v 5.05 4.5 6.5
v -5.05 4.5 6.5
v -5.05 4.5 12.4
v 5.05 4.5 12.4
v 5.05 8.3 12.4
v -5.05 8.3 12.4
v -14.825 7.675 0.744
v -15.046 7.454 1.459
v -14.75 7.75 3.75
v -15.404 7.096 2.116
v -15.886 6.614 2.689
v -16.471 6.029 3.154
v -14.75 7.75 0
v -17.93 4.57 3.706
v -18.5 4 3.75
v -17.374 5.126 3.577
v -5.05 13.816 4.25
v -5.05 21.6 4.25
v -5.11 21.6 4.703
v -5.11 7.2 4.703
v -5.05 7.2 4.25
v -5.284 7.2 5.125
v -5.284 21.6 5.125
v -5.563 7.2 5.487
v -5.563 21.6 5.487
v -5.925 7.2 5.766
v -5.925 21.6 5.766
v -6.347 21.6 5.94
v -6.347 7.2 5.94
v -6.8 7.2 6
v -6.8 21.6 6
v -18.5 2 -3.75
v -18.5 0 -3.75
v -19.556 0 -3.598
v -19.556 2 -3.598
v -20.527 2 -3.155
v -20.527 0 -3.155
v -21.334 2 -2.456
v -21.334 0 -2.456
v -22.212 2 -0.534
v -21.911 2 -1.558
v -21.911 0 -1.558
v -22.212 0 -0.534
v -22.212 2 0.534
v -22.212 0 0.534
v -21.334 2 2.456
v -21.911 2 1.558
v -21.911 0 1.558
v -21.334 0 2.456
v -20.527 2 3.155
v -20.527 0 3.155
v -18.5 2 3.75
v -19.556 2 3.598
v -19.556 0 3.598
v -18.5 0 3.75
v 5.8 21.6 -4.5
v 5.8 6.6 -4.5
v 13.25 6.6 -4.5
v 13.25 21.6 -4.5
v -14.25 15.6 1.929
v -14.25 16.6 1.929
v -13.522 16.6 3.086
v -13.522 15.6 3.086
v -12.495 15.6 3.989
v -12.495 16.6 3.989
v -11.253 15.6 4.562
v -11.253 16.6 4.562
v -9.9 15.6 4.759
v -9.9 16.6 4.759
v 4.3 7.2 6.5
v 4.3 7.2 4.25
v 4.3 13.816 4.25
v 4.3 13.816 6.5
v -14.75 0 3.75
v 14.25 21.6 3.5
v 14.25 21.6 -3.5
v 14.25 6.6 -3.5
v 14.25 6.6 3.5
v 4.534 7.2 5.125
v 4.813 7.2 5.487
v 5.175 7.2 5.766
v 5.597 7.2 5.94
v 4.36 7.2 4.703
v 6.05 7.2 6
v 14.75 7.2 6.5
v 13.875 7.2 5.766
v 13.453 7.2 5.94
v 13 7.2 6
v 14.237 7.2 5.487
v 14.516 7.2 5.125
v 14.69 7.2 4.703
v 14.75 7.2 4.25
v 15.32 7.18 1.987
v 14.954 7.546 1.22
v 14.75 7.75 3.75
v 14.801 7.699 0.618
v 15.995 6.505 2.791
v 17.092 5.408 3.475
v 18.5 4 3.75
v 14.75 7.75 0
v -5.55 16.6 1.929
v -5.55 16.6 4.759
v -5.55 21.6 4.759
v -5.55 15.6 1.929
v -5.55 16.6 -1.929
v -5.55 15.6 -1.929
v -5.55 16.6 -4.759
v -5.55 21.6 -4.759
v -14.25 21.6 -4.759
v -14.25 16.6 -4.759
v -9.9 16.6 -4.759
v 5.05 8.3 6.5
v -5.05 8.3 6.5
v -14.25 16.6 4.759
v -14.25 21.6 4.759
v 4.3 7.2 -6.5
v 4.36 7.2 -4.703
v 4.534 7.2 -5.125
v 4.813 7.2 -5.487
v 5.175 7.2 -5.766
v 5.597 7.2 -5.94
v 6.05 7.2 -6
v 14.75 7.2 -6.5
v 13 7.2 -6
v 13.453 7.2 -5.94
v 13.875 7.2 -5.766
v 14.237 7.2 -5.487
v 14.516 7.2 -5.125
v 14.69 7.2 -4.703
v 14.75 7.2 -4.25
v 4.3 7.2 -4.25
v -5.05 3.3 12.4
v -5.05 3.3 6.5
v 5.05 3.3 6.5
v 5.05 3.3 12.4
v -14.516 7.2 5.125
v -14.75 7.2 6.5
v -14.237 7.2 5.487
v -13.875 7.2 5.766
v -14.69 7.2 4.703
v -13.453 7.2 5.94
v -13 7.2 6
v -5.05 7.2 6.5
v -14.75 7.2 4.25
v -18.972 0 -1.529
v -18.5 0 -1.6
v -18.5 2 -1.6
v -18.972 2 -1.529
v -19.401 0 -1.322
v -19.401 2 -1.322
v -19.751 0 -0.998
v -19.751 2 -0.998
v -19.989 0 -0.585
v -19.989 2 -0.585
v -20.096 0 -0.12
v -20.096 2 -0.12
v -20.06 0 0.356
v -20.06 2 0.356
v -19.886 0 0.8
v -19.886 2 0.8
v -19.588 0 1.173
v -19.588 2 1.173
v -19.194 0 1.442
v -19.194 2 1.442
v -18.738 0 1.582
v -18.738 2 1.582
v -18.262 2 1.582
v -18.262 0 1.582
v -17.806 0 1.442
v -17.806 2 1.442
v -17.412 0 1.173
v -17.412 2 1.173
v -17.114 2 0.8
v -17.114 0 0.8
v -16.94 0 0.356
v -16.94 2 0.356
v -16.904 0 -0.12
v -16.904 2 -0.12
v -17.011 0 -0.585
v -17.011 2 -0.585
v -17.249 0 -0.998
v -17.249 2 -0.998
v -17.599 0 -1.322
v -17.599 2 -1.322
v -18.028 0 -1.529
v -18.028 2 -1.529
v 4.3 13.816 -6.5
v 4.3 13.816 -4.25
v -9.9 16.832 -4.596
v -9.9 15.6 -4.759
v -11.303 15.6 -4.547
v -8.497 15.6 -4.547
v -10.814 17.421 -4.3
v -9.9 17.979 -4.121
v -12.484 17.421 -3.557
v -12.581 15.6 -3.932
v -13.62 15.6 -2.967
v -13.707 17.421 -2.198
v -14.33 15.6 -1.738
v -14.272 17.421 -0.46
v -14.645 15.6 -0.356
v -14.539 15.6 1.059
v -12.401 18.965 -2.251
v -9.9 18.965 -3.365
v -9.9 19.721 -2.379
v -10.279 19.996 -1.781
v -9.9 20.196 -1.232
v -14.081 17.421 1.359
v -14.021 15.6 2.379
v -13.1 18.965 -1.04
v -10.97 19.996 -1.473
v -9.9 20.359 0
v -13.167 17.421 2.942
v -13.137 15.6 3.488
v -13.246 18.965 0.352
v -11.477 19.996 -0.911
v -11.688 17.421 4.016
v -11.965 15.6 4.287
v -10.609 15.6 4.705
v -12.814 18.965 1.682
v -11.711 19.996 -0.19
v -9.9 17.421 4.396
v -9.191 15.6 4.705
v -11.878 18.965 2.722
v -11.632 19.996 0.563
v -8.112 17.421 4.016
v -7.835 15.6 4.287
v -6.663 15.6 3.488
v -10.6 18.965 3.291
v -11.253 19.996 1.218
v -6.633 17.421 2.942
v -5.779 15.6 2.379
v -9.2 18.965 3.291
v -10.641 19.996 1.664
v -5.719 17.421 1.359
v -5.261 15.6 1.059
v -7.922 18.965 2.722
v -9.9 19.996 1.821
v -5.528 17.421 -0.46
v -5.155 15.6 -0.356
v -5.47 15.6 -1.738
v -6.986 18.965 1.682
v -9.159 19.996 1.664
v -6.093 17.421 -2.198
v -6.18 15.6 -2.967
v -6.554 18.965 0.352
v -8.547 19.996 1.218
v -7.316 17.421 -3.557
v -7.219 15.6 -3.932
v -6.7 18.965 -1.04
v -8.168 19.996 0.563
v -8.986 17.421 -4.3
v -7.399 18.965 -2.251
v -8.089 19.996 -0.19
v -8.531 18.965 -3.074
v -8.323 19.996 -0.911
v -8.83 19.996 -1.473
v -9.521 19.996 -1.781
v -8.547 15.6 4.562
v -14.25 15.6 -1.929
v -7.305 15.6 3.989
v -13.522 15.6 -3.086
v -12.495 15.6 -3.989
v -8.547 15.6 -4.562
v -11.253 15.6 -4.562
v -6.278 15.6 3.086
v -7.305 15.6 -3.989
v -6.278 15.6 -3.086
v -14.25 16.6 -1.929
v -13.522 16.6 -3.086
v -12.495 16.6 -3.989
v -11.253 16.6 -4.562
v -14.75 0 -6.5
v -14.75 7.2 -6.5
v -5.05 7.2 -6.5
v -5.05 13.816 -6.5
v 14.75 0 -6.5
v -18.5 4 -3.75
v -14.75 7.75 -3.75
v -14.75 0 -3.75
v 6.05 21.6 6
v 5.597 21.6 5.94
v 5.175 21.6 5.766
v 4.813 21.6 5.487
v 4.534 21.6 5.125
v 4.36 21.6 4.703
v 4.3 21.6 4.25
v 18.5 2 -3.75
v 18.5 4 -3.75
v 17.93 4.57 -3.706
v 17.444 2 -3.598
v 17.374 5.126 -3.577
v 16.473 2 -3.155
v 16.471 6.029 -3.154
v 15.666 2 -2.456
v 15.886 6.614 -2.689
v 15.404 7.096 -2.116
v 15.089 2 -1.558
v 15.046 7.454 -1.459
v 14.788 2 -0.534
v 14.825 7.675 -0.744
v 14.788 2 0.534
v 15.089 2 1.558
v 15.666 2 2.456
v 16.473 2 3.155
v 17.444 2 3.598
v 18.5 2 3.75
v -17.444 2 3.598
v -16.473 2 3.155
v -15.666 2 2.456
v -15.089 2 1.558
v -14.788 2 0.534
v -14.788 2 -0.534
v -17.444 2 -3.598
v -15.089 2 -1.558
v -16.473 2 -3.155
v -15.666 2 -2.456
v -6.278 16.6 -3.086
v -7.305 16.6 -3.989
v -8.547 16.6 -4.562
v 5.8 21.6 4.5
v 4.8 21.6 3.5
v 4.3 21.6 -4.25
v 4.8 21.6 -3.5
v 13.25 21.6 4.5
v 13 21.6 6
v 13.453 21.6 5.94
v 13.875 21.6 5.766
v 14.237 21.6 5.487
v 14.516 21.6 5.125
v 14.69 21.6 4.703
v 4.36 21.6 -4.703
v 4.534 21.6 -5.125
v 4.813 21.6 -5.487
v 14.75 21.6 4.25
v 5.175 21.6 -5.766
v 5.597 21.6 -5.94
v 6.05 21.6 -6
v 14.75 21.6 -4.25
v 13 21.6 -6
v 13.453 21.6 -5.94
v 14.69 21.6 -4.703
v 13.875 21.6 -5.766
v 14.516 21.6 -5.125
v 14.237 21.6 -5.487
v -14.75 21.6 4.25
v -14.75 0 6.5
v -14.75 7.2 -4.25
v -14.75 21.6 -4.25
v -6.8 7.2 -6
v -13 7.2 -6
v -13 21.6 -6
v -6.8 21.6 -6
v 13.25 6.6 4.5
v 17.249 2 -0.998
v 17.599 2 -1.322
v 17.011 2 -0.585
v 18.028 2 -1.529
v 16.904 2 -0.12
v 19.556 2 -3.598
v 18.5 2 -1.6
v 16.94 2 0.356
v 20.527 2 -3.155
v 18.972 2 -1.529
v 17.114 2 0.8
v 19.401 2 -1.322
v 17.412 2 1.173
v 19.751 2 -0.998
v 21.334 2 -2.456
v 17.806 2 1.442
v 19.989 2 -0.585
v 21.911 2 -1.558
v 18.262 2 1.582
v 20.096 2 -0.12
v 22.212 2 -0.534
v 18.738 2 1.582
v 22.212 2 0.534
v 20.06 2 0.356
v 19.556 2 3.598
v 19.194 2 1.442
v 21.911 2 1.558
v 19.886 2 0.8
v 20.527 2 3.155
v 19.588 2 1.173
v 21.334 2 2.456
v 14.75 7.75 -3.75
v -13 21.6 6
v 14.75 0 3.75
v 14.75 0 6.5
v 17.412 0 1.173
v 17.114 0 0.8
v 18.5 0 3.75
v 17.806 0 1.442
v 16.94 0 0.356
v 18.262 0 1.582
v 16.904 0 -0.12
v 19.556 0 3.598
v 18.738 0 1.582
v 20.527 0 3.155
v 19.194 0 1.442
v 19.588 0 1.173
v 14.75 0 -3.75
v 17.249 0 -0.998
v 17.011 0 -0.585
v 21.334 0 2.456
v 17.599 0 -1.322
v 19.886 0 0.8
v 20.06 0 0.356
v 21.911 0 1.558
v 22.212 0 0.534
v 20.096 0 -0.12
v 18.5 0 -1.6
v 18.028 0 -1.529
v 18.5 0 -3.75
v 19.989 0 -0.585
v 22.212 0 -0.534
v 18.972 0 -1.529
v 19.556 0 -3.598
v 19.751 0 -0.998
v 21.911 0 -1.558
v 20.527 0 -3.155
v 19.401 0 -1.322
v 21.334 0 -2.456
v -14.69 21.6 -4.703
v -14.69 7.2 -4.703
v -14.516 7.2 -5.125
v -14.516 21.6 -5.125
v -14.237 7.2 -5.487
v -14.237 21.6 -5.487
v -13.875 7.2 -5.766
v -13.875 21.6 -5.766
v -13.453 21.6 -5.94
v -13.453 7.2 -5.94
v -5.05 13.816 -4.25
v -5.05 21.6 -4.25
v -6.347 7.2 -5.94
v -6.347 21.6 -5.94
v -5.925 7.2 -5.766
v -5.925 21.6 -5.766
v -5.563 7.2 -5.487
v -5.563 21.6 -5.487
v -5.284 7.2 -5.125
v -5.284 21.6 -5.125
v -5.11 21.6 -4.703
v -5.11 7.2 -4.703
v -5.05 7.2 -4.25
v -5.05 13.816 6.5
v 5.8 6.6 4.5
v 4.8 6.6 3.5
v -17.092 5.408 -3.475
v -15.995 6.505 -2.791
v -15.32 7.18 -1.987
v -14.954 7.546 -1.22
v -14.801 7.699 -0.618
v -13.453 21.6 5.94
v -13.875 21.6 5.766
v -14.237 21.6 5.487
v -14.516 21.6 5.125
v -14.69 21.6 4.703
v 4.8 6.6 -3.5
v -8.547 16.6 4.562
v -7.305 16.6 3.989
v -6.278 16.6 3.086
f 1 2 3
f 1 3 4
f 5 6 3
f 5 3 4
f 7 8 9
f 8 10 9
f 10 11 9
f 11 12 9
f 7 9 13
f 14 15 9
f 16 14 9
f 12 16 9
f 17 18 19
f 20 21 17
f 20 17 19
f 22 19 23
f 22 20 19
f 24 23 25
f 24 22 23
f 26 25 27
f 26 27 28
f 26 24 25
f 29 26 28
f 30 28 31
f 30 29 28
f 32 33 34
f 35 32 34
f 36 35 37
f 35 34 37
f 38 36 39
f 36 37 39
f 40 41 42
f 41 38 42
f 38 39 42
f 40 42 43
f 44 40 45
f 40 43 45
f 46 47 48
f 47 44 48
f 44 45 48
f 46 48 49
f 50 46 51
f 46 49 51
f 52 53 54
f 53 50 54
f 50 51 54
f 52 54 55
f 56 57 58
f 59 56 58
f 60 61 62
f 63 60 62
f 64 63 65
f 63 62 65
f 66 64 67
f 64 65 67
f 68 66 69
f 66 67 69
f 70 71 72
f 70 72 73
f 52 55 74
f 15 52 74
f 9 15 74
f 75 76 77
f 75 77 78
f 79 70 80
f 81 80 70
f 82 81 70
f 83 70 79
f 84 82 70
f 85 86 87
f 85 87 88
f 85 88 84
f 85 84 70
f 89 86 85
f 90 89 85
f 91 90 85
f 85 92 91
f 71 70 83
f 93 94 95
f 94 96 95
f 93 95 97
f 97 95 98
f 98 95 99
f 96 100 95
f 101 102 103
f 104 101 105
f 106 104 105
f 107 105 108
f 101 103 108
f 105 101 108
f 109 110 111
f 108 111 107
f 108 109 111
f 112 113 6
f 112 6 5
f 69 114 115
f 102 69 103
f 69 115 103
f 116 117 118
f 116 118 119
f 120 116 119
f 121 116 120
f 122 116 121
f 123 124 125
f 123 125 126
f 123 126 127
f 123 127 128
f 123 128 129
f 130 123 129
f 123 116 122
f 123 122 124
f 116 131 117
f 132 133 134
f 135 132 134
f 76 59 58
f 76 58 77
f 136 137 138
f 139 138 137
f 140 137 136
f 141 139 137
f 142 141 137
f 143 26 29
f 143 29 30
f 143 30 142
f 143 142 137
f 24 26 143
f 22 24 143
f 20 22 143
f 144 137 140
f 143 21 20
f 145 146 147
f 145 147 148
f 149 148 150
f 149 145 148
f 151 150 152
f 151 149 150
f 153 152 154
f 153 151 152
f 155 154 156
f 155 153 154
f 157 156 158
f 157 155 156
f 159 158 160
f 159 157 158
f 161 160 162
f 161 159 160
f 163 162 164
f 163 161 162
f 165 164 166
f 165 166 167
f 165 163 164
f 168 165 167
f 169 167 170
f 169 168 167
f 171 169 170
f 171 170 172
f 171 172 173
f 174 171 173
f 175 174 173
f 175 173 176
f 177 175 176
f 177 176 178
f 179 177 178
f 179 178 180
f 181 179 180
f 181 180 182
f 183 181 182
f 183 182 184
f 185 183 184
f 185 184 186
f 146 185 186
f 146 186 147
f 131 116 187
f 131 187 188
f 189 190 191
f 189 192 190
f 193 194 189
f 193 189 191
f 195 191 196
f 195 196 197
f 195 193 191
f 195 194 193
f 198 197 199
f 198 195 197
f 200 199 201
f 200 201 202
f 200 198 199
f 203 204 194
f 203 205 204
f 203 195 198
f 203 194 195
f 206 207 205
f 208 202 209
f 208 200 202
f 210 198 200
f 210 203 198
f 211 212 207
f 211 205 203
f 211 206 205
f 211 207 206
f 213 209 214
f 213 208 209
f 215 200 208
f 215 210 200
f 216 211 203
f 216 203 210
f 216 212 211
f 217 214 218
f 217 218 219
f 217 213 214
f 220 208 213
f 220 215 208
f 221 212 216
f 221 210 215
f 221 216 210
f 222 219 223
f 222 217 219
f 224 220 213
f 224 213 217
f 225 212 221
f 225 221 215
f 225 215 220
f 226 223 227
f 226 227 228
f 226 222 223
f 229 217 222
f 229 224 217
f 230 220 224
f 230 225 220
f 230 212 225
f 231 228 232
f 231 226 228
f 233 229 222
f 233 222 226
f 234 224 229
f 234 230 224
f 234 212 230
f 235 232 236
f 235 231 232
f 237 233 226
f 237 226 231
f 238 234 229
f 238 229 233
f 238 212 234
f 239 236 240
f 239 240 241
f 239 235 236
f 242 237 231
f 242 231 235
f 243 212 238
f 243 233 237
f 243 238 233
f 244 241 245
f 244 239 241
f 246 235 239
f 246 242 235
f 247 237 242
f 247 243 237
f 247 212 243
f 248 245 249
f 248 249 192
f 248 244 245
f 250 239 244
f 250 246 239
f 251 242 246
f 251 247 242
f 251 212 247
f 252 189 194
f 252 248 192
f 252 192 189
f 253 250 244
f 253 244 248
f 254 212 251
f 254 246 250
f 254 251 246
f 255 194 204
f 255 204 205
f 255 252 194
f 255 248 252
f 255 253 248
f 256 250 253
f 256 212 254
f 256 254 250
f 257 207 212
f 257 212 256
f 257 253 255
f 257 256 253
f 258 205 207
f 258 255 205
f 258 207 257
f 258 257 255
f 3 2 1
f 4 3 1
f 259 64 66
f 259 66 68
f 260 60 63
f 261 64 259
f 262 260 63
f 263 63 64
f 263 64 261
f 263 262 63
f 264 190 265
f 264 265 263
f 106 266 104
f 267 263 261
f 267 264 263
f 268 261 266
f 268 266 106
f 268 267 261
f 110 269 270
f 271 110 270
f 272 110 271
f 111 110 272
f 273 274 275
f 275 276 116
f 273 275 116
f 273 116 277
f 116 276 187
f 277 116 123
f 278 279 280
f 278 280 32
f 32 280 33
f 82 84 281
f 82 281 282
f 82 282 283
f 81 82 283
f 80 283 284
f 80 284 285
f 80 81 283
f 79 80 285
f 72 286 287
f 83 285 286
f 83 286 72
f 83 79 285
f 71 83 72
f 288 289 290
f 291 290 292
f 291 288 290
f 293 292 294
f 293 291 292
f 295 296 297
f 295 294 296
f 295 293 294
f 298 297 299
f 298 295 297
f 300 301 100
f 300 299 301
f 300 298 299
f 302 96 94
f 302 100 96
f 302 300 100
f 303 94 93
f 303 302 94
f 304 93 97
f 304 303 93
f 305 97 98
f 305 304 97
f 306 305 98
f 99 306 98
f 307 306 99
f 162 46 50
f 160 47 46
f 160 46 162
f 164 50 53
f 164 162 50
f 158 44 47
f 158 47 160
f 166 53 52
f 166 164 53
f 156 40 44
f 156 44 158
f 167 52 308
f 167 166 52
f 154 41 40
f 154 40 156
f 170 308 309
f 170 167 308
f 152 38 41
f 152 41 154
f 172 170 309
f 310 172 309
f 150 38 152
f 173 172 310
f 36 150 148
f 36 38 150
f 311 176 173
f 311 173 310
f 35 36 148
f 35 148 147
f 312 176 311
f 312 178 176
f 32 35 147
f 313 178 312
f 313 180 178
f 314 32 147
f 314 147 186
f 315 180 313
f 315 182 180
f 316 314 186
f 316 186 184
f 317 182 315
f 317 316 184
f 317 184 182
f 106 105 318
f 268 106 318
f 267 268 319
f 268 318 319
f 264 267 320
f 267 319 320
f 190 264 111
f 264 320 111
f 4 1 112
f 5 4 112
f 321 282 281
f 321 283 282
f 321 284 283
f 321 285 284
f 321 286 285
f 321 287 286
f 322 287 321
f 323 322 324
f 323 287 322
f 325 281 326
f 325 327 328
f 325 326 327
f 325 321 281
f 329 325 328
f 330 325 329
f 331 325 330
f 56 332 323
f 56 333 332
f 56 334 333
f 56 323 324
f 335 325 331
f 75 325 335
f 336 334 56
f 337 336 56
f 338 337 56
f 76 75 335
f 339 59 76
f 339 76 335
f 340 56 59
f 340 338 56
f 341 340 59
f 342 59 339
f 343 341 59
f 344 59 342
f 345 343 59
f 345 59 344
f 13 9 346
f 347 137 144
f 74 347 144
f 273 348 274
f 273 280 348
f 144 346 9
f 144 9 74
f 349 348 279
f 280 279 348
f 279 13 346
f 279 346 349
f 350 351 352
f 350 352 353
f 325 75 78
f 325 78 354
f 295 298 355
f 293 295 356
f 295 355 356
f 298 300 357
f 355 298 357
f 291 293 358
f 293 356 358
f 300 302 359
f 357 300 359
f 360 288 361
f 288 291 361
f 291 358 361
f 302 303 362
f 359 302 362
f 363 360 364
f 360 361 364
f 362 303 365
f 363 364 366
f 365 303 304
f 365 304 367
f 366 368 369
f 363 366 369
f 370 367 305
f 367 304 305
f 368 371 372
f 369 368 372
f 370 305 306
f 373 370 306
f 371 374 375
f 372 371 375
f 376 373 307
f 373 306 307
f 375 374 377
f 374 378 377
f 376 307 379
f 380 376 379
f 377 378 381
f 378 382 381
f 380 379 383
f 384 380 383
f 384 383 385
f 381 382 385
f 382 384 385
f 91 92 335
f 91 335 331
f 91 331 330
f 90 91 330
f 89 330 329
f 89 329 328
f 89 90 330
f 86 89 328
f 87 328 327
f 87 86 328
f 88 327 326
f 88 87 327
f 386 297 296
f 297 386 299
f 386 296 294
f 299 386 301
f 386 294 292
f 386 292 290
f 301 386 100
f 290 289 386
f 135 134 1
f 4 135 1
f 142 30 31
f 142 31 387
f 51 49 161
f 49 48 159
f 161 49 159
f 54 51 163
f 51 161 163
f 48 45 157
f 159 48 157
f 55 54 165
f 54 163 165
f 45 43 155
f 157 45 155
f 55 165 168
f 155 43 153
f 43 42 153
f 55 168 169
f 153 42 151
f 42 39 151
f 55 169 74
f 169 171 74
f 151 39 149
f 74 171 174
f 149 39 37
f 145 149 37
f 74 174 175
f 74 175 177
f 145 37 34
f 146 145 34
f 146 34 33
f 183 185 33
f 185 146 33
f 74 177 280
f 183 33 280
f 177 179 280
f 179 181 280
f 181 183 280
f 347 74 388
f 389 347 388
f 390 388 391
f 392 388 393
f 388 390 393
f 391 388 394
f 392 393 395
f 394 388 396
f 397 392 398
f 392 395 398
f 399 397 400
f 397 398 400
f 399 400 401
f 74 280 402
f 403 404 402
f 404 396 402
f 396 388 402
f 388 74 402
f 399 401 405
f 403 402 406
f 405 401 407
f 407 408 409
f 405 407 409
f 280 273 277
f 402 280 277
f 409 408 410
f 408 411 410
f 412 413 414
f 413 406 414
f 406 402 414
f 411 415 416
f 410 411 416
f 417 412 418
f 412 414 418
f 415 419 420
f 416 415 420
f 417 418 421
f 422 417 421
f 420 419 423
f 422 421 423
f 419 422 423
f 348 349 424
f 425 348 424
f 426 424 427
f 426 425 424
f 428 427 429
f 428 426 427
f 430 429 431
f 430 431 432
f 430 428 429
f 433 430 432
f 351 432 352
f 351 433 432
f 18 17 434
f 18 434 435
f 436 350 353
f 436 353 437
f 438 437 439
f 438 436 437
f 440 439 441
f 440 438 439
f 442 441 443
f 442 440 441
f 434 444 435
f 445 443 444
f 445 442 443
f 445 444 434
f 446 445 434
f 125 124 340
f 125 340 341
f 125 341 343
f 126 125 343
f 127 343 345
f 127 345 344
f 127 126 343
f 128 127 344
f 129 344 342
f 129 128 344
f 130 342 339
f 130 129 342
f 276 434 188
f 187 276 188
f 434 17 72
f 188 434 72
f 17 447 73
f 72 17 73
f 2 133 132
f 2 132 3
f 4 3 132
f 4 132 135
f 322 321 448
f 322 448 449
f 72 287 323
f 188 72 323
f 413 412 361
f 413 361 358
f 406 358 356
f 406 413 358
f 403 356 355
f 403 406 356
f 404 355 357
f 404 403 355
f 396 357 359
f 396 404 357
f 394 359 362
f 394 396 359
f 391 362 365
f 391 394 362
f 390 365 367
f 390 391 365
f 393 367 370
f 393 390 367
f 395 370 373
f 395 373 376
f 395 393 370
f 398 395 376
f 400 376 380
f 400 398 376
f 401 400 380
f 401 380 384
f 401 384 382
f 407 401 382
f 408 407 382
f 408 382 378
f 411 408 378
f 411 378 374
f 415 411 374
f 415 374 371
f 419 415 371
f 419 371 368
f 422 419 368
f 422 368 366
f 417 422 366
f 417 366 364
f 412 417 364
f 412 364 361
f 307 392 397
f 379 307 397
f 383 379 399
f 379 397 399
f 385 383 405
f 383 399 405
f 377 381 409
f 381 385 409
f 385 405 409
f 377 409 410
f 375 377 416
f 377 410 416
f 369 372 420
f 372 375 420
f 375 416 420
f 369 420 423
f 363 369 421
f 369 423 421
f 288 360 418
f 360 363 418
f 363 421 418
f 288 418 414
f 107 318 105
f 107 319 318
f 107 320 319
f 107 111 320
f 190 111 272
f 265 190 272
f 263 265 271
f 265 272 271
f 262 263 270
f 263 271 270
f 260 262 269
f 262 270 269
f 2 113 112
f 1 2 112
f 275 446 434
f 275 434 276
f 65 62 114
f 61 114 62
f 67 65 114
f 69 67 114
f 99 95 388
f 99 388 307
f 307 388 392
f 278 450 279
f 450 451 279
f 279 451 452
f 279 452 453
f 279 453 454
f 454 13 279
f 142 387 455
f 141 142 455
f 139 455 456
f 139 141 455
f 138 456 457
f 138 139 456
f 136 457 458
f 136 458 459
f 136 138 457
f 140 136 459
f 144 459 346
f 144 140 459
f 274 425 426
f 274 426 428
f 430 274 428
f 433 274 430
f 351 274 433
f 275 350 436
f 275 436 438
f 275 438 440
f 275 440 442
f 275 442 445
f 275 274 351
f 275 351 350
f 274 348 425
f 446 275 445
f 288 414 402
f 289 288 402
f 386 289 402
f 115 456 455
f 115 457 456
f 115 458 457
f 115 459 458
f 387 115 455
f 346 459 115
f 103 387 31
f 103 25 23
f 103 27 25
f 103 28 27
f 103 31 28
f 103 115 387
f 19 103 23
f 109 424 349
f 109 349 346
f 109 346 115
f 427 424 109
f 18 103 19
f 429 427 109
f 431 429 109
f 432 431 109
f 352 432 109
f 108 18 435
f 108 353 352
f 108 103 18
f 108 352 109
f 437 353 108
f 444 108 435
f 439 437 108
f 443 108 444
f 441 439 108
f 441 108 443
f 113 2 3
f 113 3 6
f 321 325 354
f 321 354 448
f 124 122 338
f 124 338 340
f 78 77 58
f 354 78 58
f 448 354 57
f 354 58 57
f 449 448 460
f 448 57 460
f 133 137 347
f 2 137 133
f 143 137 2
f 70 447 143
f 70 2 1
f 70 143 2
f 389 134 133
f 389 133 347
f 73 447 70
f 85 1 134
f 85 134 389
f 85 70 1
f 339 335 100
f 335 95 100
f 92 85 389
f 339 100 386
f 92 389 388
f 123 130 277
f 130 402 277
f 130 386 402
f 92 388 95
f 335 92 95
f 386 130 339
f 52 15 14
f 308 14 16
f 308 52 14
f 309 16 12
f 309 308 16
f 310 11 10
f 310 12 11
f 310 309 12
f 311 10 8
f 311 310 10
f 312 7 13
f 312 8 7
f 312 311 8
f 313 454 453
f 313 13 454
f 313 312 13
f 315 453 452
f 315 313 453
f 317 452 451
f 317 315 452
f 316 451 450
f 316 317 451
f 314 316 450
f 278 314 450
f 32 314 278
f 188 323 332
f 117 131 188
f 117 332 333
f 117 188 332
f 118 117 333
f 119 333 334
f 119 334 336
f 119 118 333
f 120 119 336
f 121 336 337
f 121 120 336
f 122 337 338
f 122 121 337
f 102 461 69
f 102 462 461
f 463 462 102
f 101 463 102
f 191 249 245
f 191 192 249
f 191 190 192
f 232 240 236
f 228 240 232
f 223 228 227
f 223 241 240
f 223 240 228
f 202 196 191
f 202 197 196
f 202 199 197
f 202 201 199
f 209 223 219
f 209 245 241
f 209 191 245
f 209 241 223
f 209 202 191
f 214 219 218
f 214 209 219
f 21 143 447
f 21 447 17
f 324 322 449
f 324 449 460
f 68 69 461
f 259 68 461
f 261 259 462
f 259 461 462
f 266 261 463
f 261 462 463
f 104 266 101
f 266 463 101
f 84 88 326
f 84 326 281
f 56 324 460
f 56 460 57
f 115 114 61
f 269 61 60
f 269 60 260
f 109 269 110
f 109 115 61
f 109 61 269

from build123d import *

# Parameters (mm, degrees)
SKETCH_1_W          = 29.5
SKETCH_1_H          = 2.75
SKETCH_1_R          = 1.6
SKETCH_1_H_2        = 7.5
EXTRUDE_1_DEPTH     = 21.6
SKETCH_2_W          = 10.1
SKETCH_2_H          = 7.784294183
CUT_EXTRUDE_1_DEPTH = 21.6
SKETCH_13_R         = 3.75
CUT_EXTRUDE_7_DEPTH = 31.355765515
CUT_EXTRUDE_2_DEPTH = 28.288688133
SKETCH_6_W          = 10.45
SKETCH_6_H          = 13
EXTRUDE_2_DEPTH     = 7.784294183
CUT_EXTRUDE_START   = -14.4
CUT_EXTRUDE_3_DEPTH = 14.4
CUT_EXTRUDE_4_DEPTH = 6
SKETCH_8_W          = 8.7
SKETCH_8_H          = 9.517068374
CUT_EXTRUDE_5_DEPTH = 5
CUT_EXTRUDE_6_DEPTH = 15
SKETCH_11_W         = 10.1
SKETCH_11_H         = 1.2
EXTRUDE_3_DEPTH     = 5.9
SKETCH_12_W         = 10.1
SKETCH_12_H         = 3.8
EXTRUDE_4_DEPTH     = 5.9


with BuildPart() as part:
    # 草图1 → 凸台-拉伸1 (new body)
    # profile 1 of 5: a face of its own
    with BuildSketch(Plane(origin=(0, 0, 0), x_dir=(1, 0, 0), z_dir=(0, 1, 0))):
        with Locations((0, -5.125)):
            Rectangle(SKETCH_1_W, SKETCH_1_H)
    # profile 2 of 5: a face of its own
    with BuildSketch(Plane(origin=(0, 0, 0), x_dir=(1, 0, 0), z_dir=(0, 1, 0))):
        with BuildLine():
            Line((18.5, 3.75), (14.75, 3.75))
            Line((14.75, 3.75), (14.75, -3.75))
            Line((14.75, -3.75), (18.5, -3.75))
            ThreePointArc((18.5, -3.75), (22.25, 0), (18.5, 3.75))
        make_face()
        with Locations(Location((18.5, 0, 0), (0, 0, 90))):
            Circle(SKETCH_1_R, mode=Mode.SUBTRACT)
    # profile 3 of 5: a face of its own
    with BuildSketch(Plane(origin=(0, 0, 0), x_dir=(1, 0, 0), z_dir=(0, 1, 0))):
        Rectangle(SKETCH_1_W, SKETCH_1_H_2)
    # profile 4 of 5: a face of its own
    with BuildSketch(Plane(origin=(0, 0, 0), x_dir=(1, 0, 0), z_dir=(0, 1, 0))):
        with Locations((0, 5.125)):
            Rectangle(SKETCH_1_W, SKETCH_1_H)
    # profile 5 of 5: a face of its own
    with BuildSketch(Plane(origin=(0, 0, 0), x_dir=(1, 0, 0), z_dir=(0, 1, 0))):
        with BuildLine():
            Line((-14.75, -3.75), (-14.75, 3.75))
            Line((-14.75, 3.75), (-18.5, 3.75))
            ThreePointArc((-18.5, 3.75), (-22.25, 0), (-18.5, -3.75))
            Line((-18.5, -3.75), (-14.75, -3.75))
        make_face()
        with Locations(Location((-18.5, 0, 0), (0, 0, 90))):
            Circle(SKETCH_1_R, mode=Mode.SUBTRACT)
    extrude(amount=EXTRUDE_1_DEPTH)

    # 草图2 → 切除-拉伸1 (cut)
    with BuildSketch(Plane.XY.offset(6.5)):
        Polygon((-22.25, 2), (-18.5, 2), (-18.5, 4), (-14.75, 7.75), (-14.75, 21.6), (-22.25, 21.6), align=None)
        Polygon((18.5, 4), (18.5, 2), (22.25, 2), (22.25, 21.6), (14.75, 21.6), (14.75, 7.75), align=None)
        with Locations((0, 17.707852909)):
            Rectangle(SKETCH_2_W, SKETCH_2_H)
    extrude(amount=-CUT_EXTRUDE_1_DEPTH, mode=Mode.SUBTRACT)

    # 草图13 → 切除-拉伸7 (cut, through all)
    with BuildSketch(Plane(origin=(0, 2, 0), x_dir=(1, 0, 0), z_dir=(0, 1, 0))):
        with Locations((-18.5, 0)):
            Circle(SKETCH_13_R)
        with Locations((18.5, 0)):
            Circle(SKETCH_13_R)
    extrude(amount=CUT_EXTRUDE_7_DEPTH, mode=Mode.SUBTRACT)

    # 草图4 → 切除-拉伸2 (cut, through all)
    with BuildSketch(Plane(origin=(0, 7.2, 0), x_dir=(1, 0, 0), z_dir=(0, 1, 0))):
        with BuildLine():
            ThreePointArc((-13, -6), (-14.237436867, -5.487436867), (-14.75, -4.25))
            Line((-14.75, -4.25), (-14.75, -6.5))
            Line((-14.75, -6.5), (-5.05, -6.5))
            Line((-5.05, -6.5), (-5.05, -4.25))
            ThreePointArc((-5.05, -4.25), (-5.562563133, -5.487436867), (-6.8, -6))
            Line((-6.8, -6), (-13, -6))
        make_face()
        with BuildLine():
            Line((-5.05, 6.5), (-14.75, 6.5))
            Line((-14.75, 6.5), (-14.75, 4.25))
            ThreePointArc((-14.75, 4.25), (-14.237436867, 5.487436867), (-13, 6))
            Line((-13, 6), (-6.8, 6))
            ThreePointArc((-6.8, 6), (-5.562563133, 5.487436867), (-5.05, 4.25))
            Line((-5.05, 4.25), (-5.05, 6.5))
        make_face()
    extrude(amount=CUT_EXTRUDE_2_DEPTH, mode=Mode.SUBTRACT)

    # 草图6 → 凸台-拉伸2 (add)
    with BuildSketch(Plane(origin=(0, 21.6, 0), x_dir=(1, 0, 0), z_dir=(0, 1, 0))):
        with Locations((9.525, 0)):
            Rectangle(SKETCH_6_W, SKETCH_6_H)
    extrude(amount=-EXTRUDE_2_DEPTH)

    # 草图5 → 切除-拉伸3 (cut)
    with BuildSketch(Plane(origin=(0, 21.6, 0), x_dir=(1, 0, 0), z_dir=(0, 1, 0)).offset(CUT_EXTRUDE_START)):
        with BuildLine():
            Line((14.75, -6.5), (14.75, -4.25))
            ThreePointArc((14.75, -4.25), (14.237436867, -5.487436867), (13, -6))
            Line((13, -6), (6.05, -6))
            ThreePointArc((6.05, -6), (4.812563133, -5.487436867), (4.3, -4.25))
            Line((4.3, -4.25), (4.3, -6.5))
            Line((4.3, -6.5), (14.75, -6.5))
        make_face()
        with BuildLine():
            Line((14.75, 4.25), (14.75, 6.5))
            Line((14.75, 6.5), (4.3, 6.5))
            Line((4.3, 6.5), (4.3, 4.25))
            ThreePointArc((4.3, 4.25), (4.812563133, 5.487436867), (6.05, 6))
            Line((6.05, 6), (13, 6))
            ThreePointArc((13, 6), (14.237436867, 5.487436867), (14.75, 4.25))
        make_face()
    extrude(amount=CUT_EXTRUDE_3_DEPTH, mode=Mode.SUBTRACT)

    # 草图7 → 切除-拉伸4 (cut)
    with BuildSketch(Plane(origin=(0, 21.6, 0), x_dir=(1, 0, 0), z_dir=(0, 1, 0))):
        with BuildLine():
            ThreePointArc((-5.55, 1.929027633), (-7.305360943, 3.98892163), (-9.9, 4.758534187))
            ThreePointArc((-9.9, 4.758534187), (-12.494639057, 3.98892163), (-14.25, 1.929027633))
            Line((-14.25, 1.929027633), (-14.25, -1.929027633))
            ThreePointArc((-14.25, -1.929027633), (-12.494639057, -3.98892163), (-9.9, -4.758534187))
            ThreePointArc((-9.9, -4.758534187), (-7.305360943, -3.98892163), (-5.55, -1.929027633))
            Line((-5.55, -1.929027633), (-5.55, 1.929027633))
        make_face()
    extrude(amount=-CUT_EXTRUDE_4_DEPTH, mode=Mode.SUBTRACT)

    # 草图8 → 切除-拉伸5 (cut)
    with BuildSketch(Plane(origin=(0, 21.6, 0), x_dir=(1, 0, 0), z_dir=(0, 1, 0))):
        with Locations((-9.9, 0)):
            Rectangle(SKETCH_8_W, SKETCH_8_H)
    extrude(amount=-CUT_EXTRUDE_5_DEPTH, mode=Mode.SUBTRACT)

    # 草图10 → 切除-拉伸6 (cut)
    with BuildSketch(Plane(origin=(0, 21.6, 0), x_dir=(1, 0, 0), z_dir=(0, 1, 0))):
        Polygon((5.8, 4.5), (13.25, 4.5), (14.25, 3.5), (14.25, -3.5), (13.25, -4.5), (5.8, -4.5), (4.8, -3.5), (4.8, 3.5), align=None)
    extrude(amount=-CUT_EXTRUDE_6_DEPTH, mode=Mode.SUBTRACT)

    # 草图11 → 凸台-拉伸3 (add)
    with BuildSketch(Plane.XY.offset(6.5)):
        with Locations((0, 3.9)):
            Rectangle(SKETCH_11_W, SKETCH_11_H)
    extrude(amount=EXTRUDE_3_DEPTH)


with BuildPart() as body_2:
    # 草图9 → 旋转1 (revolve)
    with BuildSketch(Plane.YZ.offset(-9.9), mode=Mode.PRIVATE) as revolve_1_sk:
        with BuildLine():
            Line((15.6, 0), (15.6, 4.758534187))
            ThreePointArc((15.6, 4.758534187), (18.964791792, 3.364791792), (20.358534187, 0))
            Line((20.358534187, 0), (15.6, 0))
        make_face()
    revolve(revolve_1_sk.sketch.rotate(Axis((-9.9, 15.6, 0), (0, 1, 0)), 180), axis=Axis((-9.9, 15.6, 0), (0, 1, 0)))


with BuildPart() as body_3:
    # 草图12 → 凸台-拉伸4 (new body)
    with BuildSketch(Plane.XY.offset(6.5)):
        with Locations((0, 6.4)):
            Rectangle(SKETCH_12_W, SKETCH_12_H)
    extrude(amount=EXTRUDE_4_DEPTH)


solid = Compound([part.part, body_2.part, body_3.part])
